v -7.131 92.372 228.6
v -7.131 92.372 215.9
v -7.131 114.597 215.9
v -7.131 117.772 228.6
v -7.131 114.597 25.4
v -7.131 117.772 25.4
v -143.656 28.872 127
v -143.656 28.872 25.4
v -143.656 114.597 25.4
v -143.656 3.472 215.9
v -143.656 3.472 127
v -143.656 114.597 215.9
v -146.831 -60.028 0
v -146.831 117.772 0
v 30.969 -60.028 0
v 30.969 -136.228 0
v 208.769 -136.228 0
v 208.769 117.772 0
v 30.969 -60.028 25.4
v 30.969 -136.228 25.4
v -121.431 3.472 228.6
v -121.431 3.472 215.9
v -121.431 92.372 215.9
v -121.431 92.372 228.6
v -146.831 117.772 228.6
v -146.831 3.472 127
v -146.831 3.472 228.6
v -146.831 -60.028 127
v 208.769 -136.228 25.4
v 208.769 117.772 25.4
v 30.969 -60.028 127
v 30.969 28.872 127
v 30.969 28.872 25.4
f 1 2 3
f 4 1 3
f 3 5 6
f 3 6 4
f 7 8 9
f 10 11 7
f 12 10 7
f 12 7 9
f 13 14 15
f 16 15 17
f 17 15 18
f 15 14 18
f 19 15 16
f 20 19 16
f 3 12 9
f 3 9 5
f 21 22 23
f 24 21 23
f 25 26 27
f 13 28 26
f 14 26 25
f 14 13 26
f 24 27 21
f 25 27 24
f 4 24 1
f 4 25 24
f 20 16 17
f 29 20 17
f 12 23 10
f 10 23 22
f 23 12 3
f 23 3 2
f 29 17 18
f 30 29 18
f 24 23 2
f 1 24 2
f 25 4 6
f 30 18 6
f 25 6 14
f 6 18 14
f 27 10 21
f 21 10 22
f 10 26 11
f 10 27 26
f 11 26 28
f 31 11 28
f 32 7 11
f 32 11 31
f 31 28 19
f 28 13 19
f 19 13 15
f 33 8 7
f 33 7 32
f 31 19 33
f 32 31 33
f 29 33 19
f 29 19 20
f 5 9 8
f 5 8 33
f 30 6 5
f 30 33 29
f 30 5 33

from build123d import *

# Parameters (mm, degrees)
F1_DEPTH = 25.4
F3_DEPTH = 203.2
F4_W     = 177.8
F4_H     = 88.9
F5_DEPTH = 101.6
F7_DEPTH = 22.225
F8_W     = 136.525
F8_H     = 190.5
F9_DEPTH = 22.225


with BuildPart() as f1:
    # F0 (on Top) → F1 (new body)
    with BuildSketch(Plane.XY):
        Polygon((30.969309, -60.027699), (30.969309, -136.227699), (208.769309, -136.227699), (208.769309, 117.772301), (-146.830691, 117.772301), (-146.830691, -60.027699), align=None)
    extrude(amount=F1_DEPTH)

    # F2 (on face) → F3 (join)
    with BuildSketch(Plane.XY.offset(25.4)):
        Polygon((-146.830691, 117.772301), (-146.830691, 3.472301), (-121.430691, 3.472301), (-121.430691, 92.372301), (-7.130691, 92.372301), (-7.130691, 117.772301), (-121.430691, 117.772301), align=None)
    extrude(amount=F3_DEPTH)

    # F4 (on face) → F5 (join)
    with BuildSketch(Plane.XY.offset(25.4)):
        with Locations((-57.930691, -15.577699)):
            Rectangle(F4_W, F4_H)
    extrude(amount=F5_DEPTH)

    # F6 (on face) → F7 (cut)
    with BuildSketch(Plane.YZ.offset(-121.430691)):
        Polygon((92.372301, 215.9), (3.472301, 215.9), (3.472301, 127), (28.872301, 127), (28.872301, 25.4), (92.372301, 25.4), (92.372301, 127), align=None)
    extrude(amount=-F7_DEPTH, mode=Mode.SUBTRACT)

    # F8 (on face) → F9 (cut)
    with BuildSketch(Plane.XZ.offset(-92.372301)):
        with Locations((-75.393191, 120.65)):
            Rectangle(F8_W, F8_H)
    extrude(amount=-F9_DEPTH, mode=Mode.SUBTRACT)


solid = f1.part
